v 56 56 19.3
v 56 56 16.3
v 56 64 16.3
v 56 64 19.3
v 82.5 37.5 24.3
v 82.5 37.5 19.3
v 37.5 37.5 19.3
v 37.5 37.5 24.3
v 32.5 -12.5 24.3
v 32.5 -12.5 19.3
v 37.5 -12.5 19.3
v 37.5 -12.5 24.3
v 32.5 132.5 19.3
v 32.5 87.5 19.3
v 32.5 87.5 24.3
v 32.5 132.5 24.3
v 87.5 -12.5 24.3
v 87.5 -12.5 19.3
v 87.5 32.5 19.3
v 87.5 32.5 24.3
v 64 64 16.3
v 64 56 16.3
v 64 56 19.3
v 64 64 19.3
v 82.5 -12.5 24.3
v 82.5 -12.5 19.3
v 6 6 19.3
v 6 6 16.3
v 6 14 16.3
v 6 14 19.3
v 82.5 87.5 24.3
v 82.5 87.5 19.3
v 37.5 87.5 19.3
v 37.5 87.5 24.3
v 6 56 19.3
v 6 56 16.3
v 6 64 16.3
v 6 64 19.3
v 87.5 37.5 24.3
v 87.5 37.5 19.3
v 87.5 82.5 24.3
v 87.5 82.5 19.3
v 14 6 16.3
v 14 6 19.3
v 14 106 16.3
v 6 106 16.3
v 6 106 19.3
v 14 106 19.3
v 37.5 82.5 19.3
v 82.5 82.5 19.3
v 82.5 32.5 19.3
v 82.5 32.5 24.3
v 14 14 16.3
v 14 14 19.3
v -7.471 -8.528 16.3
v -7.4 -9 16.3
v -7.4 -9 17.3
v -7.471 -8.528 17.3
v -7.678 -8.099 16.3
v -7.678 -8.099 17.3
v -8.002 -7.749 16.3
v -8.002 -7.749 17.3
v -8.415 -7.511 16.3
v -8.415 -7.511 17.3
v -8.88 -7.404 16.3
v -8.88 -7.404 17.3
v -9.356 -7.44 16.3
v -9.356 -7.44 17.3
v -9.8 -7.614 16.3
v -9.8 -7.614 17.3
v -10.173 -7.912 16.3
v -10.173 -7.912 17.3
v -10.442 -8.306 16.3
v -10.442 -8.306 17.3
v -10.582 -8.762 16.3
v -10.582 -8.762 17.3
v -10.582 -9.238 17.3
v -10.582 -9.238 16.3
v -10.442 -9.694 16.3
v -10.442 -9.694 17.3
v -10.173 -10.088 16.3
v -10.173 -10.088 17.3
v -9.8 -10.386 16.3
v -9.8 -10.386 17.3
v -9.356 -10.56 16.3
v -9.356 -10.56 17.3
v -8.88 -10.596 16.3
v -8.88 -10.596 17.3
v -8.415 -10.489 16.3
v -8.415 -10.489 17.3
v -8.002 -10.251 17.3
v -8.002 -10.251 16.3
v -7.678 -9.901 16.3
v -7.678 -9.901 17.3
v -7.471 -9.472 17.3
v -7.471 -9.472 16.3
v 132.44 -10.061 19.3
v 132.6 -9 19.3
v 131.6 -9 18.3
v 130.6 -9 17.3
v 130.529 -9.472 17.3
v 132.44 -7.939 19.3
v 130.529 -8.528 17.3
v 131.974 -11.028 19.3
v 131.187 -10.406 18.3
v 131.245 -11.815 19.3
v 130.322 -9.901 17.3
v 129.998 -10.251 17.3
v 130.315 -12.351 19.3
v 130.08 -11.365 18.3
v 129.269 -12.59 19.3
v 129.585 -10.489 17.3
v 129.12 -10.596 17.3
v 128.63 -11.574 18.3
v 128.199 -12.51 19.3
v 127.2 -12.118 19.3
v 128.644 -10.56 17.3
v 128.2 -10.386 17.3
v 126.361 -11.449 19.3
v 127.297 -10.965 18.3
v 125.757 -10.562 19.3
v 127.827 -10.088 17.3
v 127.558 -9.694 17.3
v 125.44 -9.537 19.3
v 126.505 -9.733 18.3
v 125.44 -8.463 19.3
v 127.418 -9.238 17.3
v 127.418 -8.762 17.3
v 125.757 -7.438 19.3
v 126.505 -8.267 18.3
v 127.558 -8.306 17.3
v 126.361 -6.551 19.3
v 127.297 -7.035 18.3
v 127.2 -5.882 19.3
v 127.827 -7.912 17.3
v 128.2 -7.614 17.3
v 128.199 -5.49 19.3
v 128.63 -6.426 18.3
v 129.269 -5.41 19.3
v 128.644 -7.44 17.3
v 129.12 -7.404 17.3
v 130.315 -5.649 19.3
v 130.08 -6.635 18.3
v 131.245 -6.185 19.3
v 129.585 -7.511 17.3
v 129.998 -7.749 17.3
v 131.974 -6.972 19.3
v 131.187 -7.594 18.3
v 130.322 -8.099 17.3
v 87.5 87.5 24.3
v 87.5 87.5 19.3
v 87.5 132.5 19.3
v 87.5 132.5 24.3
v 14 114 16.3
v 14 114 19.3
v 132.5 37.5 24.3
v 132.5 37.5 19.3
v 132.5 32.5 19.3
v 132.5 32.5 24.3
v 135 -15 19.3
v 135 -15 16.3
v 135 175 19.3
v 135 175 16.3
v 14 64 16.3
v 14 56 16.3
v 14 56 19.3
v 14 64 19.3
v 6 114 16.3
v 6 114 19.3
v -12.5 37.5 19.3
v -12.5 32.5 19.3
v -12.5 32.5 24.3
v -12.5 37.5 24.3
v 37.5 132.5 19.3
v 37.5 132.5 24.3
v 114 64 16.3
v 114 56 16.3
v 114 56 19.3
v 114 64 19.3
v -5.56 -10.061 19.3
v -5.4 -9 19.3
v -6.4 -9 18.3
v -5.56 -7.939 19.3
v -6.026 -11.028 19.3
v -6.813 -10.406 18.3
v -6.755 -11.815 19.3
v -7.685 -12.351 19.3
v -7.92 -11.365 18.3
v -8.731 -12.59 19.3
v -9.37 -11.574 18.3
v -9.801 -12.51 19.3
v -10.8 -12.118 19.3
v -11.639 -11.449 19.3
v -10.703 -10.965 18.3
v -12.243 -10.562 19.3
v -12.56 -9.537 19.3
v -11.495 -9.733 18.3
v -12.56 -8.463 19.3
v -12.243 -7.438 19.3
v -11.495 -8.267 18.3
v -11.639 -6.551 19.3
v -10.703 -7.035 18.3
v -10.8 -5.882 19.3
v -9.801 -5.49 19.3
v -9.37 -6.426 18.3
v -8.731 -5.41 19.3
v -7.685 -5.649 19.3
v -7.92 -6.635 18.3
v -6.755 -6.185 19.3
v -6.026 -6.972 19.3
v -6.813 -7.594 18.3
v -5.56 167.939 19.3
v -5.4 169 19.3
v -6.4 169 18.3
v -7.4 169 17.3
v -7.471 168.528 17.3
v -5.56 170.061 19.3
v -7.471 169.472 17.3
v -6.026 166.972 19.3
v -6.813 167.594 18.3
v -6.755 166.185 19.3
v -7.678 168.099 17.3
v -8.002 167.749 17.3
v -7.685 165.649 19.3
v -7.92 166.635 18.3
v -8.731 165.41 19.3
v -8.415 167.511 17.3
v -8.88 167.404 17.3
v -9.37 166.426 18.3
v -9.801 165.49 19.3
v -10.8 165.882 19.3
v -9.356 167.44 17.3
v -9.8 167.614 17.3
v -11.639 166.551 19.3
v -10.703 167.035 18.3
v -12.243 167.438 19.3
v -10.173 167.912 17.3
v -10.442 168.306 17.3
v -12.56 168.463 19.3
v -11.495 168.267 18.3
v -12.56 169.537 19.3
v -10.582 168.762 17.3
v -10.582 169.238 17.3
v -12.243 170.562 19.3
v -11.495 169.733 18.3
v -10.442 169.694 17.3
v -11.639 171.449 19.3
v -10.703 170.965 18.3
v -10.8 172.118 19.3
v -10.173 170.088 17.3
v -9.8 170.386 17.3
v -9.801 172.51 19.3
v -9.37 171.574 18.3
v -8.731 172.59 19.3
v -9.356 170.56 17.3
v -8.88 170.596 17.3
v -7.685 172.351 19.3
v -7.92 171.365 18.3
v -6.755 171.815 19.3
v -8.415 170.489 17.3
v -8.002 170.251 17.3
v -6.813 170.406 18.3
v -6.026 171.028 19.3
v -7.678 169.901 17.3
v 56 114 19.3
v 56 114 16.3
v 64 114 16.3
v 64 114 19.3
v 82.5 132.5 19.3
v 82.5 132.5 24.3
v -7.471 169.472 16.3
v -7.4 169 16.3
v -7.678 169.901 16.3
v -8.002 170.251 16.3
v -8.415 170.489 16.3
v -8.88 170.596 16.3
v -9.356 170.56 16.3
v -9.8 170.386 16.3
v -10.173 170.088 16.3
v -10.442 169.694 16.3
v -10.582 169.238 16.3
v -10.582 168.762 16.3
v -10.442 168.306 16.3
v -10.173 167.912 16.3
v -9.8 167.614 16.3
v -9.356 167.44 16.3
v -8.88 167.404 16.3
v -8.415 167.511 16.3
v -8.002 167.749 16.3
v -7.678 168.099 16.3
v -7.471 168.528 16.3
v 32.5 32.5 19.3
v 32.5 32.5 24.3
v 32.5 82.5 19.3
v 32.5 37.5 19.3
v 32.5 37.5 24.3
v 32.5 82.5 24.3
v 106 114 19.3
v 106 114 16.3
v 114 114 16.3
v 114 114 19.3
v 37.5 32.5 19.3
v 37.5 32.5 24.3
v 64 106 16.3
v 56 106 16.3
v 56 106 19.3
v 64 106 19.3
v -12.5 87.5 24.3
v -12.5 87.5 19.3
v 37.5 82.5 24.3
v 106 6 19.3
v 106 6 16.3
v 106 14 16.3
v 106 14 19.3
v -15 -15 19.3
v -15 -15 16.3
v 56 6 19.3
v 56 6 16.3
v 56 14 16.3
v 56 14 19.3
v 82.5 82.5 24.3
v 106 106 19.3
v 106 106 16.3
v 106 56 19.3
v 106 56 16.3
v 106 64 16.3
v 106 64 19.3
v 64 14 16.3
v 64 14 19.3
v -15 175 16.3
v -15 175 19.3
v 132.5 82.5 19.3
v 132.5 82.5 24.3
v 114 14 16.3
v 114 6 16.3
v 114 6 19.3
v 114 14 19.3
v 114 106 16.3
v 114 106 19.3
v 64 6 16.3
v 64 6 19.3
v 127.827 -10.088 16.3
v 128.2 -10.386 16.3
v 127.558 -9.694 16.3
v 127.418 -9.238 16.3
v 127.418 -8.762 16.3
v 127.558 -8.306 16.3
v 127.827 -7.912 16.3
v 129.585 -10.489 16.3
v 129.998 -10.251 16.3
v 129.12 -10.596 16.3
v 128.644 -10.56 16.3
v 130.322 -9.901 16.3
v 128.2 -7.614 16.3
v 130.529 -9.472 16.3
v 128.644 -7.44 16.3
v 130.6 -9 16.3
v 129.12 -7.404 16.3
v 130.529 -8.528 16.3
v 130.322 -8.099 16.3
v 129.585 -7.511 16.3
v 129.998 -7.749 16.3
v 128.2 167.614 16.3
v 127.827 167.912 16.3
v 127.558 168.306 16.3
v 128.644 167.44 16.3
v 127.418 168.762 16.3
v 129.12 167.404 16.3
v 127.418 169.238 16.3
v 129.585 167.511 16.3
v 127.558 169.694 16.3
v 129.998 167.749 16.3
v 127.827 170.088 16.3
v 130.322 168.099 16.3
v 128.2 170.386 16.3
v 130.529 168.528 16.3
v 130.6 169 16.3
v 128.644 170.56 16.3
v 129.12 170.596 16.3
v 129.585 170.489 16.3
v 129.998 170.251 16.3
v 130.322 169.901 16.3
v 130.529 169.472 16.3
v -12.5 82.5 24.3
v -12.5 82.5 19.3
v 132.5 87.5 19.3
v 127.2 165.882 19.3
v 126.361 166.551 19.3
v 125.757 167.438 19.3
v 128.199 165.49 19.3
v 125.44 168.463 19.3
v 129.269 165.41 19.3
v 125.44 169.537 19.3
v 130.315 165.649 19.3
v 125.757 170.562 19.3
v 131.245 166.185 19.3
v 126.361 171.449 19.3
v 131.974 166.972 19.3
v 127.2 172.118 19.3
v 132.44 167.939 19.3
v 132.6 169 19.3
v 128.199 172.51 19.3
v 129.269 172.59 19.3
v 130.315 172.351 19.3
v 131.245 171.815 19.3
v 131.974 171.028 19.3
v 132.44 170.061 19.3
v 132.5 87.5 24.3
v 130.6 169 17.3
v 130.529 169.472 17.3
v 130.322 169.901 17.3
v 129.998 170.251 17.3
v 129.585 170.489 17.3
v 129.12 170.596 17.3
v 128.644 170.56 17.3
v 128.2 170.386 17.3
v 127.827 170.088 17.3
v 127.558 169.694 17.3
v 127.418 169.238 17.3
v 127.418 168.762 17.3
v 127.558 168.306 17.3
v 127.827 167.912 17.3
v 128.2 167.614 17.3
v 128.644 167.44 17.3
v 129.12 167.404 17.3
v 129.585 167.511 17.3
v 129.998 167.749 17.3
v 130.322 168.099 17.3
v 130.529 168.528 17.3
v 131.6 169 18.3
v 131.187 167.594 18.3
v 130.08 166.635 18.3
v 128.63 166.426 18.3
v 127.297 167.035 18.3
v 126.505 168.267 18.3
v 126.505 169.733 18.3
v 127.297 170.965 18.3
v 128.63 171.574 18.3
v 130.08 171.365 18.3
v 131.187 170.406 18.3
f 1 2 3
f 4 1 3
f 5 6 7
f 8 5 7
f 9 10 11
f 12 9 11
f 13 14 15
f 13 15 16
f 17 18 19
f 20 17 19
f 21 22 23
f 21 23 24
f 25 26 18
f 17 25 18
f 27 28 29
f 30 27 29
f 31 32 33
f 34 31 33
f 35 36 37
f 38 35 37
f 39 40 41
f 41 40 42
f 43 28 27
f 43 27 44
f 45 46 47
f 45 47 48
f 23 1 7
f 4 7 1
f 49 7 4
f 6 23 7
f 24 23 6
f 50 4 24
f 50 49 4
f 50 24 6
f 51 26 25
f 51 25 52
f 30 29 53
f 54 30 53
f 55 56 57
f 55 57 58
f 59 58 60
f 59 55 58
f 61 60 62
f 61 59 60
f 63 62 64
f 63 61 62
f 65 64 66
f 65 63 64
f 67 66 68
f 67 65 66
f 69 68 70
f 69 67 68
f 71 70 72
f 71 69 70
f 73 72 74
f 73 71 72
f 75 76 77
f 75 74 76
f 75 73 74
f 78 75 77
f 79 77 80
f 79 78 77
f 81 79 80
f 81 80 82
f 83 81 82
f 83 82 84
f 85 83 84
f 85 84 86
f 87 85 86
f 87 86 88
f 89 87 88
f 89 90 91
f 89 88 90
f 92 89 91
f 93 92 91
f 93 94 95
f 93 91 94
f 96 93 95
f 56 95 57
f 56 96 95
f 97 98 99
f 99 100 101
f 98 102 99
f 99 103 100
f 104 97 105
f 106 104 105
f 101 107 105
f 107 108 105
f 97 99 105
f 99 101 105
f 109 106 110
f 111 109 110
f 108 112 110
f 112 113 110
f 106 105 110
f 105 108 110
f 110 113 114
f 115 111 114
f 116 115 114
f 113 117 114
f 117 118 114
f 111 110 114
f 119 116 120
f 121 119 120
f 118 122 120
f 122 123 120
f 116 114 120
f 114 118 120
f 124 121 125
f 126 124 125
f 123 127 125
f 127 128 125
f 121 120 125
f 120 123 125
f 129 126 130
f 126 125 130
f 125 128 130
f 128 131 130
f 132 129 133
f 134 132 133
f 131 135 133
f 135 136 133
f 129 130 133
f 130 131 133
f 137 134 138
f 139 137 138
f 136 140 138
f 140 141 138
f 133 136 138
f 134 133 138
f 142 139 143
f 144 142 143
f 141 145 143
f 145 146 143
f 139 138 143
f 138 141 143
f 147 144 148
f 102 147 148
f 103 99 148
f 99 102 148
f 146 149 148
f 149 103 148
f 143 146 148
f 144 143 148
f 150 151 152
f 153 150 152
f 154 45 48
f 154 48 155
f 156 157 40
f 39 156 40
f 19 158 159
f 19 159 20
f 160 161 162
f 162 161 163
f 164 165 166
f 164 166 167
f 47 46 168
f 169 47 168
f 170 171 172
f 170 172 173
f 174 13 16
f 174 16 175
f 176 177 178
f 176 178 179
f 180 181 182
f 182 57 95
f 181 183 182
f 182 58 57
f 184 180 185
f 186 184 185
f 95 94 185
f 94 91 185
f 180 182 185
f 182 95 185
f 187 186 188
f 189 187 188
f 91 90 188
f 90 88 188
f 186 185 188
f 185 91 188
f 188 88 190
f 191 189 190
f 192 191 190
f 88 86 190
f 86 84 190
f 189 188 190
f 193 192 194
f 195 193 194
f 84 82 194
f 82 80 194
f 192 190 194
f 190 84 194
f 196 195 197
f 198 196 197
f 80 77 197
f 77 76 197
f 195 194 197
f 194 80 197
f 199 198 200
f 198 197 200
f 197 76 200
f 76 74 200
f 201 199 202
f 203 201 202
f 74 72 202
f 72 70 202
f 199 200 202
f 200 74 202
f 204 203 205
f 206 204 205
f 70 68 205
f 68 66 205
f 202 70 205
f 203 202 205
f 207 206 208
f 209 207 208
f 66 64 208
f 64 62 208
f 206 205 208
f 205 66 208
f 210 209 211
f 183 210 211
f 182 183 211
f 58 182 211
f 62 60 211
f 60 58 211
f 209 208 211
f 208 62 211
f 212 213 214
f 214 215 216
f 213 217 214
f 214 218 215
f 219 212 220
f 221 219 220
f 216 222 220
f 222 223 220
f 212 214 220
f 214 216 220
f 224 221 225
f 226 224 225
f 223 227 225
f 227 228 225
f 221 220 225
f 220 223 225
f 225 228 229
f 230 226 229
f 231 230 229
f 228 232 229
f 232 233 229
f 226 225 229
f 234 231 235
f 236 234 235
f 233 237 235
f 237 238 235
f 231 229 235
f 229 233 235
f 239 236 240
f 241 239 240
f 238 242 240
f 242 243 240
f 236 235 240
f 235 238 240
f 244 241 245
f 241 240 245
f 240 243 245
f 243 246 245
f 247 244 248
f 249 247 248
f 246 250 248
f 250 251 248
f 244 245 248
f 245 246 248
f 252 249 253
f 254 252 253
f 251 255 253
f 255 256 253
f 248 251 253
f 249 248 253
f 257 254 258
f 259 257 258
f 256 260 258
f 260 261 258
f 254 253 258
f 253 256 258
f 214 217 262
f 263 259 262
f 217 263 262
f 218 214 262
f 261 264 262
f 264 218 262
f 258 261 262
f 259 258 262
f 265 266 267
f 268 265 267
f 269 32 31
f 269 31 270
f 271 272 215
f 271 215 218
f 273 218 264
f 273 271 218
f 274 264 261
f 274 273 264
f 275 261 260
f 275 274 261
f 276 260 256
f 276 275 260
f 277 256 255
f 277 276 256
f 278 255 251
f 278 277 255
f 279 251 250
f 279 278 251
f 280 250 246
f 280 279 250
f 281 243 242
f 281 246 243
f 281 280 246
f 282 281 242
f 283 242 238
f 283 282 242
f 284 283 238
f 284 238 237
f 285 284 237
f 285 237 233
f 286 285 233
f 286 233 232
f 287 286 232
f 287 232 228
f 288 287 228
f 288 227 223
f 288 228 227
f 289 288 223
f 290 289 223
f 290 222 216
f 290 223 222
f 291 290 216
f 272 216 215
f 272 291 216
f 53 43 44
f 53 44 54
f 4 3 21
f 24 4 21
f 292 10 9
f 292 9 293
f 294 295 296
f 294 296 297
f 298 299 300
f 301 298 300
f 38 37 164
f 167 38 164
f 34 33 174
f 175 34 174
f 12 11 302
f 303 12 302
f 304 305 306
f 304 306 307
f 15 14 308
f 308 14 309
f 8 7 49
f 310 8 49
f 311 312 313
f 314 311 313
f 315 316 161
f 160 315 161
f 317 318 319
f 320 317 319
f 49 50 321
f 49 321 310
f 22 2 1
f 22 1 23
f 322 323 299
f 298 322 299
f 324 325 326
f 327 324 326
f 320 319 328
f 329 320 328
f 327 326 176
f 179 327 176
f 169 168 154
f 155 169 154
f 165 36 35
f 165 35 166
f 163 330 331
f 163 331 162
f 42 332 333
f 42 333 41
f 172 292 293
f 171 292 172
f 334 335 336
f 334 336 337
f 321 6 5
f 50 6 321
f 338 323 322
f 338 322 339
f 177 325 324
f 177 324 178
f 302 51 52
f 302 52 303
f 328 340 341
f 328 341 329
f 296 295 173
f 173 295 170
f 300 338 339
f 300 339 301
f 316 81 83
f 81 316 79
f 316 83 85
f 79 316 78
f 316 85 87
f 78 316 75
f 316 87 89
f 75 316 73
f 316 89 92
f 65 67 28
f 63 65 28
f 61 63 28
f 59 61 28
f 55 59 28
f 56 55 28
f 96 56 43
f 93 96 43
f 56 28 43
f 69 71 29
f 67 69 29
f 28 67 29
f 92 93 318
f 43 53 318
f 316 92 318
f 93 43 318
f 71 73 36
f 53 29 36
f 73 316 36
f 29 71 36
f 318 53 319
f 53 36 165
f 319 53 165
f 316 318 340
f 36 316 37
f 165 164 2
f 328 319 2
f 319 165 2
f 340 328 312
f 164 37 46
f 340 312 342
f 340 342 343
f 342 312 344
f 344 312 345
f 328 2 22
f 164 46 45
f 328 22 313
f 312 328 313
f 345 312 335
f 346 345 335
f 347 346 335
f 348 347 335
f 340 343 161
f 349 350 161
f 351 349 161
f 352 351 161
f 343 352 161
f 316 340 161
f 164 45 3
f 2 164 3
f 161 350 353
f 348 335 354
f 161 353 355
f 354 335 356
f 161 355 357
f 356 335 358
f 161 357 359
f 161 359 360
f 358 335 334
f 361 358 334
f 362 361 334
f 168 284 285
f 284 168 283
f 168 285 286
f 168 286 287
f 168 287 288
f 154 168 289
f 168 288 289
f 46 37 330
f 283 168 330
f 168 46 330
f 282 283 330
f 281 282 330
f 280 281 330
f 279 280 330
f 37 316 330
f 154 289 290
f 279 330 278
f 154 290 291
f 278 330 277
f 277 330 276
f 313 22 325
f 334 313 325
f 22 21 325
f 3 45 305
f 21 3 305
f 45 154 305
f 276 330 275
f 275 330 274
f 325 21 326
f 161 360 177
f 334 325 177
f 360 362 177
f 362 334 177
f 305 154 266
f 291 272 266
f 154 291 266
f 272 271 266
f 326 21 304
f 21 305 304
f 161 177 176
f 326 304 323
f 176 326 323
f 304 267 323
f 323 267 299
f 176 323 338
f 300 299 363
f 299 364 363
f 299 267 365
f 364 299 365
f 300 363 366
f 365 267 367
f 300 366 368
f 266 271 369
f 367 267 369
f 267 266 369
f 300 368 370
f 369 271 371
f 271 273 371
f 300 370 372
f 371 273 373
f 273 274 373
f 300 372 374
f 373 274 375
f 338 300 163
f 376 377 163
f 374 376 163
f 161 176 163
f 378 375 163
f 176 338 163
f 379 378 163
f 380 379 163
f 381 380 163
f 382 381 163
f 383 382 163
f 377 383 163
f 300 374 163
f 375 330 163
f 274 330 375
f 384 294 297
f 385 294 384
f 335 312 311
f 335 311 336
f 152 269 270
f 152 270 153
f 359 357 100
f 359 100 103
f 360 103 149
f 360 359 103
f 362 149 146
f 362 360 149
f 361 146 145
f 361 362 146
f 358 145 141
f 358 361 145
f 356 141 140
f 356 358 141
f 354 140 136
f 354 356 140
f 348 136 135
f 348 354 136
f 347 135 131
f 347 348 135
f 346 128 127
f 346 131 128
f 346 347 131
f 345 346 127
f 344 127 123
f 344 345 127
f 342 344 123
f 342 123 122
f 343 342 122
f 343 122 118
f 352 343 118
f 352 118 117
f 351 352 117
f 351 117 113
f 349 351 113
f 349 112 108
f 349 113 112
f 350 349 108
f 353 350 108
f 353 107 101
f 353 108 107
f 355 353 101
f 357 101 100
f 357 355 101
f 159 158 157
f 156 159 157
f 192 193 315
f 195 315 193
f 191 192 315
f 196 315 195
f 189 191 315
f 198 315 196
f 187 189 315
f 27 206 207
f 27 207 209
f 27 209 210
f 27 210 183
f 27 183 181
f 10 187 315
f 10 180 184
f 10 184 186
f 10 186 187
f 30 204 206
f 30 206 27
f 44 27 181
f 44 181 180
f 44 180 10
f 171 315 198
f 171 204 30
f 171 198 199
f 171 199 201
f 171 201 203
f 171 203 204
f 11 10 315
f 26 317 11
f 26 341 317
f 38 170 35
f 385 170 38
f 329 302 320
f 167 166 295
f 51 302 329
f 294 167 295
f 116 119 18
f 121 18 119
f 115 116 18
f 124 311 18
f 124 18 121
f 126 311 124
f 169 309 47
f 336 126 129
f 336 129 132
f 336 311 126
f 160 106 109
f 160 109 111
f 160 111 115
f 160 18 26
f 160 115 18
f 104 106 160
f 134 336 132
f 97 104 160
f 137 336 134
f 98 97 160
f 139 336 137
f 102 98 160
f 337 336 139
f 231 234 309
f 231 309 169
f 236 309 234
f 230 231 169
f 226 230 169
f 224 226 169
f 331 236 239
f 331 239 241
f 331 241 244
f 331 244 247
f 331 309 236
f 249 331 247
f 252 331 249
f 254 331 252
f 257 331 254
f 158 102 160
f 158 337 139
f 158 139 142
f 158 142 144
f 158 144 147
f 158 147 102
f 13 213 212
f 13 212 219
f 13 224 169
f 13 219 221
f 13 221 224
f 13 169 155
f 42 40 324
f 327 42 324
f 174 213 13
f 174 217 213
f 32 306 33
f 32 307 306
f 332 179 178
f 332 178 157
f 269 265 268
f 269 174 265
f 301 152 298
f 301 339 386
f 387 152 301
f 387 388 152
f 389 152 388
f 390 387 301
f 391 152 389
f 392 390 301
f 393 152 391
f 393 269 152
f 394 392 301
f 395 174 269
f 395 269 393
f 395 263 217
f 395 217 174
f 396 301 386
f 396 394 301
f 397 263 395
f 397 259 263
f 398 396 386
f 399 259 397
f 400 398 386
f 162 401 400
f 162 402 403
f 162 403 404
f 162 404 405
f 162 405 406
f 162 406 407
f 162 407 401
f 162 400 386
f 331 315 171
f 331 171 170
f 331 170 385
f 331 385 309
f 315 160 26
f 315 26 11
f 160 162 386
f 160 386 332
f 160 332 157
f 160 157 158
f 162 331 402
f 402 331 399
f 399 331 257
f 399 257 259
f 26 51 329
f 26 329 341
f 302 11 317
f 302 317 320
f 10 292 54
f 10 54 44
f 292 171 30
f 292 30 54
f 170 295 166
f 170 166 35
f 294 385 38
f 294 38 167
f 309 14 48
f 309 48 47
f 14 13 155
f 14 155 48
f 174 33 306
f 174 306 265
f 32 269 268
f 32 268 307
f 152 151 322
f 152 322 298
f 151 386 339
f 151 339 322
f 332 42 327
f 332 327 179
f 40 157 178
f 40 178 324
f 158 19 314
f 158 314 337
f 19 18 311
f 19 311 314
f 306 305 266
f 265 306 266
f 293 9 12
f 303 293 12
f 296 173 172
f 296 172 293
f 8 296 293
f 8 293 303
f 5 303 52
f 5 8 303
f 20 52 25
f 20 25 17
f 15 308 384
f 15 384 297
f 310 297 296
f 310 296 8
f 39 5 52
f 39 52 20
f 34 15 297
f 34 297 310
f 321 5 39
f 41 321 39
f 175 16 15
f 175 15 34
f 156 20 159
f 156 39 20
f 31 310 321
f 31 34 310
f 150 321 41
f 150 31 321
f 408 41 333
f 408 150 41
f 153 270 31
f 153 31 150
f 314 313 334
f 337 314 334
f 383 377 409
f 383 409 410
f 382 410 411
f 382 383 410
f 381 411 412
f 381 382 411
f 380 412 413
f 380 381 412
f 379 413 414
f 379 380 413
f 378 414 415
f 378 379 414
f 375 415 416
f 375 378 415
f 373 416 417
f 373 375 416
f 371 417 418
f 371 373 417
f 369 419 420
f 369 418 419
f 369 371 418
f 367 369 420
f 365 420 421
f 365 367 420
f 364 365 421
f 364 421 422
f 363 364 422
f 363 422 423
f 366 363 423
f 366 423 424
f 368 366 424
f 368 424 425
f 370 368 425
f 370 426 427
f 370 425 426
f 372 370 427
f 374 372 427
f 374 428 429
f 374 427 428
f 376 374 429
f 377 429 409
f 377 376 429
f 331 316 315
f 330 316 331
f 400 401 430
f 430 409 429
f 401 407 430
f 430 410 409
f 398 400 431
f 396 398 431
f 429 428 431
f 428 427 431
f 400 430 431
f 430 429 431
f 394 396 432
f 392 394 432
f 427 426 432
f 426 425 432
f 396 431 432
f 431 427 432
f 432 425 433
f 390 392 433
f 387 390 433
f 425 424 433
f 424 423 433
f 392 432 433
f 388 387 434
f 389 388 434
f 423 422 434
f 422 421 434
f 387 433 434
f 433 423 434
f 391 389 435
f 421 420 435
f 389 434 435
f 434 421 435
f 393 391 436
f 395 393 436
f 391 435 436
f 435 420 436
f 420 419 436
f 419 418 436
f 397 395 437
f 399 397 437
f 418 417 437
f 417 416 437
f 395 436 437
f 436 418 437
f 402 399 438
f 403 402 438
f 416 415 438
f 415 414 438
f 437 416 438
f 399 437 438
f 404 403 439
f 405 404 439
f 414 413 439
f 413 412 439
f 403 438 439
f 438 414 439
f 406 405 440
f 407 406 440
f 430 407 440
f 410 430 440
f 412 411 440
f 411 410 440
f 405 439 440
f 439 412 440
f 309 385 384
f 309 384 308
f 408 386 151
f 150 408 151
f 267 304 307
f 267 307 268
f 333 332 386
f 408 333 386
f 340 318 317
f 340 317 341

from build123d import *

# Parameters (mm, degrees)
CYLINDER006_R            = 1.6
CYLINDER006_DEPTH        = 10
BOX005_W                 = 5
BOX005_H                 = 145
BOX005_DEPTH             = 5
CLONE001_PLACEMENT_ANGLE = 90
BOX003_W                 = 8
BOX003_H                 = 8
BOX003_DEPTH             = 20
ARRAY001_X_COUNT         = 3
ARRAY001_X_PITCH         = 50
ARRAY001_Y_COUNT         = 3
ARRAY001_Y_PITCH         = 50
BOX002_W                 = 150
BOX002_H                 = 190
BOX002_DEPTH             = 3
CLONE002_PLACEMENT_ANGLE = 90
CHAMFER_SIZE             = 2


with BuildPart() as cylinder006:
    # Cylinder006 → Cylinder006 (new body)
    with BuildSketch(Plane(origin=(-9, 169, 6.3), x_dir=(1, 0, 0), z_dir=(0, 0, 1))):
        Circle(CYLINDER006_R)
    extrude(amount=CYLINDER006_DEPTH)


with BuildPart() as clone_of_cylinder007:
    # Clone007 base: copy of Cylinder006
    add(cylinder006.part)


with BuildPart() as clone_of_cylinder007_1:
    # Clone007 placement: moved
    add(clone_of_cylinder007.part.moved(Location((138, 0, 0))))


with BuildPart() as clone_of_cylinder006:
    # Clone006 base: copy of Cylinder006
    add(cylinder006.part)


with BuildPart() as clone_of_cylinder006_1:
    # Clone006 placement: moved
    add(clone_of_cylinder006.part.moved(Location((138, -178, 0))))


with BuildPart() as clone_of_fusion007:
    # Clone008 base: copy of Cylinder006
    add(cylinder006.part)


with BuildPart() as clone_of_fusion007_1:
    # Clone008 placement: moved
    add(clone_of_fusion007.part.moved(Location((0, -178, 0))))

    # Fusion007: union Clone of Cylinder007, Clone of Cylinder006, Cylinder006
    add(clone_of_cylinder007_1.part)
    add(clone_of_cylinder006_1.part)
    add(cylinder006.part)


with BuildPart() as clone_of_fusion007_2:
    # Clone009 placement: moved
    add(clone_of_fusion007_1.part.moved(Location((0, 0, 5))))


with BuildPart() as cube005:
    # Box005 → Box005 (new body)
    with BuildSketch(Plane(origin=(82.5, -12.5, 19.3), x_dir=(1, 0, 0), z_dir=(0, 0, 1))):
        with Locations((2.5, 72.5)):
            Rectangle(BOX005_W, BOX005_H)
    extrude(amount=BOX005_DEPTH)


with BuildPart() as clone_of_cube006:
    # Clone001 base: copy of Cube005
    add(cube005.part)


with BuildPart() as clone_of_cube006_1:
    # Clone001 placement: moved
    add(clone_of_cube006.part.moved(Location((120, 0, 0))).rotate(Axis((120, 0, 0), (0, 0, 1)), CLONE001_PLACEMENT_ANGLE))


with BuildPart() as clone_of_cube005:
    # Clone base: copy of Cube005
    add(cube005.part)


with BuildPart() as clone_of_cube005_1:
    # Clone placement: moved
    add(clone_of_cube005.part.moved(Location((-50, 0, 0))))


with BuildPart() as array001:
    # Box003 → Box003 (new body)
    with BuildSketch(Plane(origin=(6, 6, 5), x_dir=(1, 0, 0), z_dir=(0, 0, 1))):
        with Locations((4, 4)):
            Rectangle(BOX003_W, BOX003_H)
    extrude(amount=BOX003_DEPTH)

    # Array001 X: Array001 ×3


with BuildPart() as array001_1:
    add(array001.part)
    with Locations(*[(i * ARRAY001_X_PITCH, 0, 0) for i in range(1, ARRAY001_X_COUNT)]):
        add(array001.part)

    # Array001 Y: Array001 ×3


with BuildPart() as array001_2:
    add(array001_1.part)
    with Locations(*[(0, i * ARRAY001_Y_PITCH, 0) for i in range(1, ARRAY001_Y_COUNT)]):
        add(array001_1.part)


with BuildPart() as cut:
    # Box002 → Box002 (new body)
    with BuildSketch(Plane(origin=(-15, -15, 16.3), x_dir=(1, 0, 0), z_dir=(0, 0, 1))):
        with Locations((75, 95)):
            Rectangle(BOX002_W, BOX002_H)
    extrude(amount=BOX002_DEPTH)

    # Cut: cut Array001
    add(array001_2.part, mode=Mode.SUBTRACT)


with BuildPart() as chamfer_body:
    # Clone002 base: copy of Cube005
    add(cube005.part)


with BuildPart() as chamfer_body_1:
    # Clone002 placement: moved
    add(chamfer_body.part.moved(Location((120, -50, 0))).rotate(Axis((120, -50, 0), (0, 0, 1)), CLONE002_PLACEMENT_ANGLE))

    # Fusion005: union Clone of Cube006, Clone of Cube005, Cube005, Cut
    add(clone_of_cube006_1.part)
    add(clone_of_cube005_1.part)
    add(cube005.part)
    add(cut.part)

    # Cut005: cut Clone of Fusion007
    add(clone_of_fusion007_2.part, mode=Mode.SUBTRACT)

    # Chamfer
    chamfer_edges = [chamfer_body_1.edges().sort_by_distance(p)[0] for p in [
        (127.4, -9, 19.3),
        (-10.6, -9, 19.3),
        (127.4, 169, 19.3),
        (-10.6, 169, 19.3),
    ]]
    chamfer(chamfer_edges, length=CHAMFER_SIZE)


solid = chamfer_body_1.part
